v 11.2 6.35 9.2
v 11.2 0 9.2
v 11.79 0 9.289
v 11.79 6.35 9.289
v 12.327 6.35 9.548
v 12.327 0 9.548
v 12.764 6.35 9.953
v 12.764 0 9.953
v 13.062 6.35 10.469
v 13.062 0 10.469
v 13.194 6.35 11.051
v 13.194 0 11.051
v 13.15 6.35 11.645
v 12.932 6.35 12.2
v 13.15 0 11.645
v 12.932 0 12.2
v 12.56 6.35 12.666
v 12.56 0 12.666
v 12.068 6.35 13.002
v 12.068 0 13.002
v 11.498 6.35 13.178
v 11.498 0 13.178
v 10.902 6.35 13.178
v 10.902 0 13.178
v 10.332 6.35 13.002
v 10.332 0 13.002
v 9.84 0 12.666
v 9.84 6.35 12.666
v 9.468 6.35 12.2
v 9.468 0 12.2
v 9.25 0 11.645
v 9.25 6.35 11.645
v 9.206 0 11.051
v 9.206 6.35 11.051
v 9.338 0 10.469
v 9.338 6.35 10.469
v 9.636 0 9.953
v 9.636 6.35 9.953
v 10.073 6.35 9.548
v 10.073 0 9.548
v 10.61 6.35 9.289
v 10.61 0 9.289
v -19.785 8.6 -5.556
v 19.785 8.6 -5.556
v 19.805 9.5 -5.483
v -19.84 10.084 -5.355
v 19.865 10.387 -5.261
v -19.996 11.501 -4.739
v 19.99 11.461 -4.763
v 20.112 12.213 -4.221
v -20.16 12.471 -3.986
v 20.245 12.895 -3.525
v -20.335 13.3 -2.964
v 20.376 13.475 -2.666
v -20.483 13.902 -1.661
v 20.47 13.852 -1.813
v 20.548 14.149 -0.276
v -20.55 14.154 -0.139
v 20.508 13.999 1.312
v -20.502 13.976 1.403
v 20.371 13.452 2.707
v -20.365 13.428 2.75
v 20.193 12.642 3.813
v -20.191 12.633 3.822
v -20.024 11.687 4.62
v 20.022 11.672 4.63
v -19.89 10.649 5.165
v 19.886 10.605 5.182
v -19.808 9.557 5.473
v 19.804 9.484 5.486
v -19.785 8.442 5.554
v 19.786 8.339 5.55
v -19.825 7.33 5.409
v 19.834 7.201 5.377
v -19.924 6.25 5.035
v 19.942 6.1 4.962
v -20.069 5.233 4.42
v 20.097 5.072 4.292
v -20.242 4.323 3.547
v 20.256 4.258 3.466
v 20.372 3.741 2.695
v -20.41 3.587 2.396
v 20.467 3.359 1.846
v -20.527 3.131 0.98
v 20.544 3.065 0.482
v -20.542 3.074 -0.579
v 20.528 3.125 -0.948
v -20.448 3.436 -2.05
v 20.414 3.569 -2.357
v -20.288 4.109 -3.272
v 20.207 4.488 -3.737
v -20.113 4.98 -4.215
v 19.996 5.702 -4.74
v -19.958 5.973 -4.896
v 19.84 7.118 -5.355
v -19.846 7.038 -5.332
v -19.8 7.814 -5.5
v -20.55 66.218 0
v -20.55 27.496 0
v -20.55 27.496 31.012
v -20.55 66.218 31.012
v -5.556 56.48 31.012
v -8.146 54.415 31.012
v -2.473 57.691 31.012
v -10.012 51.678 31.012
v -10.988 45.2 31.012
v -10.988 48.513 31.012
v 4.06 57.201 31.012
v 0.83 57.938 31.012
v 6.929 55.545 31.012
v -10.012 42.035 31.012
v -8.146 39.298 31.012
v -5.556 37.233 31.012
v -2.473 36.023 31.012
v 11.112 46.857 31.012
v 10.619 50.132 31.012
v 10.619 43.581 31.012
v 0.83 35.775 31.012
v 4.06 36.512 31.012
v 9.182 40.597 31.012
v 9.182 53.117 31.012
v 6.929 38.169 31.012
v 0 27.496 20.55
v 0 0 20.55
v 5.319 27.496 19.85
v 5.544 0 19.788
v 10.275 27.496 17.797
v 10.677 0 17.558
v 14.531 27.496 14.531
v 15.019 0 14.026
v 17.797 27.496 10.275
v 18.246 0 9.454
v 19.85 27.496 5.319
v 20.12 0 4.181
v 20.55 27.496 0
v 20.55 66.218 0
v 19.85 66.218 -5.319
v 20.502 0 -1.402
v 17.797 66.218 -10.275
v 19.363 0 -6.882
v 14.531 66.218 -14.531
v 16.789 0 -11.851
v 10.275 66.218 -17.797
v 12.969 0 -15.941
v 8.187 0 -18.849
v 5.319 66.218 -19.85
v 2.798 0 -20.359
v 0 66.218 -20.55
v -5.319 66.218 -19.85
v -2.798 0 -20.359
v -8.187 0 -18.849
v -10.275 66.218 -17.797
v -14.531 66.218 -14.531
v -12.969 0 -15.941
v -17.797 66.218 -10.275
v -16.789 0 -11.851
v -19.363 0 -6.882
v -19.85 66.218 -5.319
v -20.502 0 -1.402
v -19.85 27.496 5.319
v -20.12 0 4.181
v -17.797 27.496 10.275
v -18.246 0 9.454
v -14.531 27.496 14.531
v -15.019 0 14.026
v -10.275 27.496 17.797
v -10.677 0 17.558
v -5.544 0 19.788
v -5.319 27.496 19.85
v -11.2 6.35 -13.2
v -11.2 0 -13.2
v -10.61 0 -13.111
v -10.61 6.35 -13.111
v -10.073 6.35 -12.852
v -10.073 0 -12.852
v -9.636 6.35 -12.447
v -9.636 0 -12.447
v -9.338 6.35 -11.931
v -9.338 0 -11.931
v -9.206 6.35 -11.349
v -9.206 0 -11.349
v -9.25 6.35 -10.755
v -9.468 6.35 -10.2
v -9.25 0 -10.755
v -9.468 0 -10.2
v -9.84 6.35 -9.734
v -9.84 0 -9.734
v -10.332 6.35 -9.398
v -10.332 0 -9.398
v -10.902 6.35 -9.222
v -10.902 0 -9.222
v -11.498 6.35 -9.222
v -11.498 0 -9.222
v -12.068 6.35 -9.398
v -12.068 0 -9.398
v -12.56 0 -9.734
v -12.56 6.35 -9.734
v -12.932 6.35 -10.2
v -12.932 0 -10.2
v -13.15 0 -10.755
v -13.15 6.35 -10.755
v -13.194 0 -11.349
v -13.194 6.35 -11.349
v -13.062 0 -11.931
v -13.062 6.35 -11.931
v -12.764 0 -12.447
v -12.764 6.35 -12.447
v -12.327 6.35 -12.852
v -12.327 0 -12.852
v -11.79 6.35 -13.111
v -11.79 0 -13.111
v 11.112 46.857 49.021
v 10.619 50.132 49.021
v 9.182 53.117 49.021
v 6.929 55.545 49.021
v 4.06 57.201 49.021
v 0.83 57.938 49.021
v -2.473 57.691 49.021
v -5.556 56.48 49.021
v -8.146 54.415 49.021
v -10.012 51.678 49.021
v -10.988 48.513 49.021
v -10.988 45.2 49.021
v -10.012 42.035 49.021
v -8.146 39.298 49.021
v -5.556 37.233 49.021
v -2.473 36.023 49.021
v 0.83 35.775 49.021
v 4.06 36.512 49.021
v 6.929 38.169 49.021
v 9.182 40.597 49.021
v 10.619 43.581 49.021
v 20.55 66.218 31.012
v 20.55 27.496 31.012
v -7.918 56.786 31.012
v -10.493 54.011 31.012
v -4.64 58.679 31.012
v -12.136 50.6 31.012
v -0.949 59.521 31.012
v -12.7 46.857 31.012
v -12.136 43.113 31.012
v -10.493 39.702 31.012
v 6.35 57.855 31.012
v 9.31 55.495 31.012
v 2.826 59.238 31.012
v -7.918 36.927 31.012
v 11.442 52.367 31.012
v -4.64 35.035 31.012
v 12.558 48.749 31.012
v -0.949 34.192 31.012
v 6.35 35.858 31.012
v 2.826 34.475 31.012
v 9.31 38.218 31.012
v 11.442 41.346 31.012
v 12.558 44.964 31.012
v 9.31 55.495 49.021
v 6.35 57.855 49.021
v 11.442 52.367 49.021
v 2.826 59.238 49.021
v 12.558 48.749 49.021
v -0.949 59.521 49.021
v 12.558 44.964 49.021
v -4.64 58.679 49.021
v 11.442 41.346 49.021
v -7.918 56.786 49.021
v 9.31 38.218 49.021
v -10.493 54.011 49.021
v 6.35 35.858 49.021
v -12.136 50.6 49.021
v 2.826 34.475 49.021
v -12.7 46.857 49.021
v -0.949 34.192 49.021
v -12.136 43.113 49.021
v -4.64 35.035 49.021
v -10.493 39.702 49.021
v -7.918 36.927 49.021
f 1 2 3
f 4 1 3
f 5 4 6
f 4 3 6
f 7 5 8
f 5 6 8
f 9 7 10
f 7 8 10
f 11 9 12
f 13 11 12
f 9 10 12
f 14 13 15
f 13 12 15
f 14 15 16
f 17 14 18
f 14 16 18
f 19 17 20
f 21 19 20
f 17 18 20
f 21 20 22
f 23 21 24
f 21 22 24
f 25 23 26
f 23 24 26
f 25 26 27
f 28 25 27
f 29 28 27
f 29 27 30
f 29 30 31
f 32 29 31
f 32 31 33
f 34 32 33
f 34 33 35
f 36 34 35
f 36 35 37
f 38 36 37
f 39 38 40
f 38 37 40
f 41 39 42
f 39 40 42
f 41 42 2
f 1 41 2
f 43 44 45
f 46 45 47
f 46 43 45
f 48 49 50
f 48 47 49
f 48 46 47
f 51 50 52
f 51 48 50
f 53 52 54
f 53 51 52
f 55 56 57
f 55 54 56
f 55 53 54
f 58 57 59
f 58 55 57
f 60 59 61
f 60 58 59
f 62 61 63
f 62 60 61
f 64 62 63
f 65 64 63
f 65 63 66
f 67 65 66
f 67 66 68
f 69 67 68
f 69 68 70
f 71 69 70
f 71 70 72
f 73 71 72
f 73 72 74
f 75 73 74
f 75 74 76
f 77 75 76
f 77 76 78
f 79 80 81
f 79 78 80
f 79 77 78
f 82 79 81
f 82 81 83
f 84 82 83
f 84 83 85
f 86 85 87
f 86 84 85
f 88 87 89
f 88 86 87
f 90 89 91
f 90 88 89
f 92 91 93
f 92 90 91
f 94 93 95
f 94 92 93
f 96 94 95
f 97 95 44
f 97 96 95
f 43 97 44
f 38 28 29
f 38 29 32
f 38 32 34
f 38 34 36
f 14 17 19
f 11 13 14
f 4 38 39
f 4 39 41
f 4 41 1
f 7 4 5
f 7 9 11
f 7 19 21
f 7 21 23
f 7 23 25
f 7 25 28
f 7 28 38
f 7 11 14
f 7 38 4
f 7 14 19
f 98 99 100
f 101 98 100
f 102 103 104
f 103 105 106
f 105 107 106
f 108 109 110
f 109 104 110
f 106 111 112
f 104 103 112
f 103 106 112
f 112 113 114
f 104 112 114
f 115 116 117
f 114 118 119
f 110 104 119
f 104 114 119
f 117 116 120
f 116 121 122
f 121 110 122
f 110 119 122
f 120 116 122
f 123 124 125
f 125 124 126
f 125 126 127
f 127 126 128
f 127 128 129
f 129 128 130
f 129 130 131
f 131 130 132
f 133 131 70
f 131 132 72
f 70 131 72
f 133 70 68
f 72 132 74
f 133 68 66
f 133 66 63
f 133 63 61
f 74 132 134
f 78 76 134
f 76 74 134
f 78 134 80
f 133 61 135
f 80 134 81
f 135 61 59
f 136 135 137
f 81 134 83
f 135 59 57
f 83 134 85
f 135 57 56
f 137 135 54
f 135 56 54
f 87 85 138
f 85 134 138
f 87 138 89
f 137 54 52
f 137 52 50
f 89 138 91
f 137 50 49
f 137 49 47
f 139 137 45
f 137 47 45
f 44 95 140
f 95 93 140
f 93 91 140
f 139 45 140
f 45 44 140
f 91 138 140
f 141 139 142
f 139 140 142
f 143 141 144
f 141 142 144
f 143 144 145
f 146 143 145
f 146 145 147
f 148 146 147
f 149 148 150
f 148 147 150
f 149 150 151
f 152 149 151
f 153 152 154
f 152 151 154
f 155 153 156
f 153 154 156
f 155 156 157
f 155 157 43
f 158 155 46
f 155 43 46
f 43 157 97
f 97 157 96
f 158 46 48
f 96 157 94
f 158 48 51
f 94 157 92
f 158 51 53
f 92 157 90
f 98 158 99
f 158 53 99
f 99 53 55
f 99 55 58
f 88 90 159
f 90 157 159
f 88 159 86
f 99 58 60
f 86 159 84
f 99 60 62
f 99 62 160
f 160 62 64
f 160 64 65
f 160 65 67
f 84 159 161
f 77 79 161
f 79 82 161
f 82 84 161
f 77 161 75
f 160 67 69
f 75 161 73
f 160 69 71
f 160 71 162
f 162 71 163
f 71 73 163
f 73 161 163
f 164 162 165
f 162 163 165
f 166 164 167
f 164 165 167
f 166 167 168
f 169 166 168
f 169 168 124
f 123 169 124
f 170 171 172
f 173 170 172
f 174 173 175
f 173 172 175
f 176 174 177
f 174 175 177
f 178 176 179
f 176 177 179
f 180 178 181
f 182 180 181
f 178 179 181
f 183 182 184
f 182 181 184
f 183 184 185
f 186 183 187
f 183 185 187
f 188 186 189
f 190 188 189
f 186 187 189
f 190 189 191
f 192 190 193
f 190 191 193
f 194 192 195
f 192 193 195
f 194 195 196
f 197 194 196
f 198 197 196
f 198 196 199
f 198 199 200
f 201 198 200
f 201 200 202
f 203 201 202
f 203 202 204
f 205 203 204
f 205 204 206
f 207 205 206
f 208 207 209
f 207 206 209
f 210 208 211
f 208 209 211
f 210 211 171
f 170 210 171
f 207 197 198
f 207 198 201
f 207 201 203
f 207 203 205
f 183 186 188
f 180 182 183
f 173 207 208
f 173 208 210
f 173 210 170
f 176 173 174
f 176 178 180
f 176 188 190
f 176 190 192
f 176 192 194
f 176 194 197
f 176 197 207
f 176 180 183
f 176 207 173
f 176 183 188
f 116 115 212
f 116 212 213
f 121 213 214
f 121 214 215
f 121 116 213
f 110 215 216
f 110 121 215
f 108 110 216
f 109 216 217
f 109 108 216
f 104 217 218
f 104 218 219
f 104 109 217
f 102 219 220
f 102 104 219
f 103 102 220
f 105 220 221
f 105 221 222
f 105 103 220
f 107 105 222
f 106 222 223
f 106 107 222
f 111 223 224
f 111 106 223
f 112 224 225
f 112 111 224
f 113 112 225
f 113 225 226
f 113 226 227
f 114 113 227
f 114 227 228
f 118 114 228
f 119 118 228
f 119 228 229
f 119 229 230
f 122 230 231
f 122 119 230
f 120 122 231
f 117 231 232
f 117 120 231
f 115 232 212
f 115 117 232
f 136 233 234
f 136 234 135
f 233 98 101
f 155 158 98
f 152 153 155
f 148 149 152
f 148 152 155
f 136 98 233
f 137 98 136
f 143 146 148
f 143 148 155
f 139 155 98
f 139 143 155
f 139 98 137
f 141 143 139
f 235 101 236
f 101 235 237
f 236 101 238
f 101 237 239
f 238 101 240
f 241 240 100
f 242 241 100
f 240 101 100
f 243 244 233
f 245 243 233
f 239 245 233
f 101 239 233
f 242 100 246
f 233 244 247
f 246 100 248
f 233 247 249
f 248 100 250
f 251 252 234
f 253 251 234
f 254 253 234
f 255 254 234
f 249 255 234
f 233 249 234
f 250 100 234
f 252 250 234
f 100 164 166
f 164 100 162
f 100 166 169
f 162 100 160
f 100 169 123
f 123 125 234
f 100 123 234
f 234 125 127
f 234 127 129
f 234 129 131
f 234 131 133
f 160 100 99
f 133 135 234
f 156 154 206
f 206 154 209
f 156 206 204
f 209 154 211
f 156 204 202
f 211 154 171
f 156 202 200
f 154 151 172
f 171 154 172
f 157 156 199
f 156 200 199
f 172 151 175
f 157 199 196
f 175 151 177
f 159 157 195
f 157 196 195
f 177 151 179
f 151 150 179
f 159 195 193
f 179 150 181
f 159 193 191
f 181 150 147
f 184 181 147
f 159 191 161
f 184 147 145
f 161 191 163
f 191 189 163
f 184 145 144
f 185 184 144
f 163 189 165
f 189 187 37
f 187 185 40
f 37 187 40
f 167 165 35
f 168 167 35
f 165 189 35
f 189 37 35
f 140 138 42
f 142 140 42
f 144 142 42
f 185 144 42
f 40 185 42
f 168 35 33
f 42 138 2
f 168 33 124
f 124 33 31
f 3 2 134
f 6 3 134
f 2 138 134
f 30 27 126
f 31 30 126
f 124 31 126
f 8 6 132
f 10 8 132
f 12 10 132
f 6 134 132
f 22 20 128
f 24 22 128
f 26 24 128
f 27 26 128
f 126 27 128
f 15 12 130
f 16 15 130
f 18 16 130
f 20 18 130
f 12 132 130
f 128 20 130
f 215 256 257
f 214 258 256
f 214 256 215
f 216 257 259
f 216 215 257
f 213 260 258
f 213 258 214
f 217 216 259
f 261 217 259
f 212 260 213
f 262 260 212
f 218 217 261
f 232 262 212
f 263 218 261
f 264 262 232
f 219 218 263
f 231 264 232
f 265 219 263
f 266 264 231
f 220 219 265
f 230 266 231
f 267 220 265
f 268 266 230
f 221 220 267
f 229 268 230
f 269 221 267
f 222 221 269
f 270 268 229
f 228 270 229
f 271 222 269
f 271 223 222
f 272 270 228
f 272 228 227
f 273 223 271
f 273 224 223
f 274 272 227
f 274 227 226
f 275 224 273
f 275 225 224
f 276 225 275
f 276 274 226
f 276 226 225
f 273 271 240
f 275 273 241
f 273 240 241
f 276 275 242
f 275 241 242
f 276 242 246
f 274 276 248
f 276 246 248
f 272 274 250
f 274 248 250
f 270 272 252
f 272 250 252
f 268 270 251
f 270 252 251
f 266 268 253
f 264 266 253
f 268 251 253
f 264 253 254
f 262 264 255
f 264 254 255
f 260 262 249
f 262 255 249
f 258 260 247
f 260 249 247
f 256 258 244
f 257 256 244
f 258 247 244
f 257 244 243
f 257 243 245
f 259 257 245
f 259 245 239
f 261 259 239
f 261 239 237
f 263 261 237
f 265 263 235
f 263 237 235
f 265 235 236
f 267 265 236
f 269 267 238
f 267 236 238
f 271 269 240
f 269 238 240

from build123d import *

# Parameters (mm, degrees)
SKETCH1_R        = 20.55
BASE_DEPTH       = 27.4955
TOP_DEPTH        = 38.7223
SKETCH3_R        = 2
MOUNTING_DEPTH   = 6.35
NPTF_DEPTH       = 76.952904361
NPTF_DEPTH_BACK  = 76.952904361
SKETCH4_R        = 5.55625
SKETCH5_R        = 12.7
SKETCH5_R_2      = 11.1125
CABLE_TUBE_DEPTH = 18.0086


with BuildPart() as part:
    # Sketch1 → BASE (new body)
    with BuildSketch(Plane(origin=(0, 0, 0), x_dir=(1, 0, 0), z_dir=(0, 1, 0))):
        with Locations(Location((0, 0, 0), (0, 0, 270))):
            Circle(SKETCH1_R)
    extrude(amount=BASE_DEPTH)

    # Sketch2 → TOP (add)
    with BuildSketch(Plane(origin=(0, 27.4955, 0), x_dir=(1, 0, 0), z_dir=(0, 1, 0))):
        with BuildLine():
            Line((-20.55, 0), (-20.55, -31.012))
            Line((-20.55, -31.012), (20.55, -31.012))
            Line((20.55, -31.012), (20.55, 0))
            ThreePointArc((20.55, 0), (0, 20.55), (-20.55, 0))
        make_face()
    extrude(amount=TOP_DEPTH)

    # Sketch3 → MOUNTING (cut)
    with BuildSketch(Plane.XZ):
        with Locations(Location((11.2, 11.2, 0), (0, 0, 270))):
            Circle(SKETCH3_R)
        with Locations(Location((-11.2, -11.2, 0), (0, 0, 270))):
            Circle(SKETCH3_R)
    extrude(amount=-MOUNTING_DEPTH, mode=Mode.SUBTRACT)

    # Sketch4 → NPTF (cut, two sides: drawn at the far end of the back side and taken through both)
    with BuildSketch(Plane(origin=(0, 0, 0), x_dir=(0, 0, -1), z_dir=(1, 0, 0)).offset(-NPTF_DEPTH_BACK)):
        with Locations((0, 8.6)):
            Circle(SKETCH4_R)
    extrude(amount=NPTF_DEPTH + NPTF_DEPTH_BACK, mode=Mode.SUBTRACT)

    # Sketch5 → CABLE_TUBE (add)
    with BuildSketch(Plane.XY.offset(31.012)):
        with Locations(Location((0, 46.85665, 0), (0, 0, 180))):
            Circle(SKETCH5_R)
        with Locations((0, 46.85665)):
            Circle(SKETCH5_R_2, mode=Mode.SUBTRACT)
    extrude(amount=CABLE_TUBE_DEPTH)


solid = part.part
